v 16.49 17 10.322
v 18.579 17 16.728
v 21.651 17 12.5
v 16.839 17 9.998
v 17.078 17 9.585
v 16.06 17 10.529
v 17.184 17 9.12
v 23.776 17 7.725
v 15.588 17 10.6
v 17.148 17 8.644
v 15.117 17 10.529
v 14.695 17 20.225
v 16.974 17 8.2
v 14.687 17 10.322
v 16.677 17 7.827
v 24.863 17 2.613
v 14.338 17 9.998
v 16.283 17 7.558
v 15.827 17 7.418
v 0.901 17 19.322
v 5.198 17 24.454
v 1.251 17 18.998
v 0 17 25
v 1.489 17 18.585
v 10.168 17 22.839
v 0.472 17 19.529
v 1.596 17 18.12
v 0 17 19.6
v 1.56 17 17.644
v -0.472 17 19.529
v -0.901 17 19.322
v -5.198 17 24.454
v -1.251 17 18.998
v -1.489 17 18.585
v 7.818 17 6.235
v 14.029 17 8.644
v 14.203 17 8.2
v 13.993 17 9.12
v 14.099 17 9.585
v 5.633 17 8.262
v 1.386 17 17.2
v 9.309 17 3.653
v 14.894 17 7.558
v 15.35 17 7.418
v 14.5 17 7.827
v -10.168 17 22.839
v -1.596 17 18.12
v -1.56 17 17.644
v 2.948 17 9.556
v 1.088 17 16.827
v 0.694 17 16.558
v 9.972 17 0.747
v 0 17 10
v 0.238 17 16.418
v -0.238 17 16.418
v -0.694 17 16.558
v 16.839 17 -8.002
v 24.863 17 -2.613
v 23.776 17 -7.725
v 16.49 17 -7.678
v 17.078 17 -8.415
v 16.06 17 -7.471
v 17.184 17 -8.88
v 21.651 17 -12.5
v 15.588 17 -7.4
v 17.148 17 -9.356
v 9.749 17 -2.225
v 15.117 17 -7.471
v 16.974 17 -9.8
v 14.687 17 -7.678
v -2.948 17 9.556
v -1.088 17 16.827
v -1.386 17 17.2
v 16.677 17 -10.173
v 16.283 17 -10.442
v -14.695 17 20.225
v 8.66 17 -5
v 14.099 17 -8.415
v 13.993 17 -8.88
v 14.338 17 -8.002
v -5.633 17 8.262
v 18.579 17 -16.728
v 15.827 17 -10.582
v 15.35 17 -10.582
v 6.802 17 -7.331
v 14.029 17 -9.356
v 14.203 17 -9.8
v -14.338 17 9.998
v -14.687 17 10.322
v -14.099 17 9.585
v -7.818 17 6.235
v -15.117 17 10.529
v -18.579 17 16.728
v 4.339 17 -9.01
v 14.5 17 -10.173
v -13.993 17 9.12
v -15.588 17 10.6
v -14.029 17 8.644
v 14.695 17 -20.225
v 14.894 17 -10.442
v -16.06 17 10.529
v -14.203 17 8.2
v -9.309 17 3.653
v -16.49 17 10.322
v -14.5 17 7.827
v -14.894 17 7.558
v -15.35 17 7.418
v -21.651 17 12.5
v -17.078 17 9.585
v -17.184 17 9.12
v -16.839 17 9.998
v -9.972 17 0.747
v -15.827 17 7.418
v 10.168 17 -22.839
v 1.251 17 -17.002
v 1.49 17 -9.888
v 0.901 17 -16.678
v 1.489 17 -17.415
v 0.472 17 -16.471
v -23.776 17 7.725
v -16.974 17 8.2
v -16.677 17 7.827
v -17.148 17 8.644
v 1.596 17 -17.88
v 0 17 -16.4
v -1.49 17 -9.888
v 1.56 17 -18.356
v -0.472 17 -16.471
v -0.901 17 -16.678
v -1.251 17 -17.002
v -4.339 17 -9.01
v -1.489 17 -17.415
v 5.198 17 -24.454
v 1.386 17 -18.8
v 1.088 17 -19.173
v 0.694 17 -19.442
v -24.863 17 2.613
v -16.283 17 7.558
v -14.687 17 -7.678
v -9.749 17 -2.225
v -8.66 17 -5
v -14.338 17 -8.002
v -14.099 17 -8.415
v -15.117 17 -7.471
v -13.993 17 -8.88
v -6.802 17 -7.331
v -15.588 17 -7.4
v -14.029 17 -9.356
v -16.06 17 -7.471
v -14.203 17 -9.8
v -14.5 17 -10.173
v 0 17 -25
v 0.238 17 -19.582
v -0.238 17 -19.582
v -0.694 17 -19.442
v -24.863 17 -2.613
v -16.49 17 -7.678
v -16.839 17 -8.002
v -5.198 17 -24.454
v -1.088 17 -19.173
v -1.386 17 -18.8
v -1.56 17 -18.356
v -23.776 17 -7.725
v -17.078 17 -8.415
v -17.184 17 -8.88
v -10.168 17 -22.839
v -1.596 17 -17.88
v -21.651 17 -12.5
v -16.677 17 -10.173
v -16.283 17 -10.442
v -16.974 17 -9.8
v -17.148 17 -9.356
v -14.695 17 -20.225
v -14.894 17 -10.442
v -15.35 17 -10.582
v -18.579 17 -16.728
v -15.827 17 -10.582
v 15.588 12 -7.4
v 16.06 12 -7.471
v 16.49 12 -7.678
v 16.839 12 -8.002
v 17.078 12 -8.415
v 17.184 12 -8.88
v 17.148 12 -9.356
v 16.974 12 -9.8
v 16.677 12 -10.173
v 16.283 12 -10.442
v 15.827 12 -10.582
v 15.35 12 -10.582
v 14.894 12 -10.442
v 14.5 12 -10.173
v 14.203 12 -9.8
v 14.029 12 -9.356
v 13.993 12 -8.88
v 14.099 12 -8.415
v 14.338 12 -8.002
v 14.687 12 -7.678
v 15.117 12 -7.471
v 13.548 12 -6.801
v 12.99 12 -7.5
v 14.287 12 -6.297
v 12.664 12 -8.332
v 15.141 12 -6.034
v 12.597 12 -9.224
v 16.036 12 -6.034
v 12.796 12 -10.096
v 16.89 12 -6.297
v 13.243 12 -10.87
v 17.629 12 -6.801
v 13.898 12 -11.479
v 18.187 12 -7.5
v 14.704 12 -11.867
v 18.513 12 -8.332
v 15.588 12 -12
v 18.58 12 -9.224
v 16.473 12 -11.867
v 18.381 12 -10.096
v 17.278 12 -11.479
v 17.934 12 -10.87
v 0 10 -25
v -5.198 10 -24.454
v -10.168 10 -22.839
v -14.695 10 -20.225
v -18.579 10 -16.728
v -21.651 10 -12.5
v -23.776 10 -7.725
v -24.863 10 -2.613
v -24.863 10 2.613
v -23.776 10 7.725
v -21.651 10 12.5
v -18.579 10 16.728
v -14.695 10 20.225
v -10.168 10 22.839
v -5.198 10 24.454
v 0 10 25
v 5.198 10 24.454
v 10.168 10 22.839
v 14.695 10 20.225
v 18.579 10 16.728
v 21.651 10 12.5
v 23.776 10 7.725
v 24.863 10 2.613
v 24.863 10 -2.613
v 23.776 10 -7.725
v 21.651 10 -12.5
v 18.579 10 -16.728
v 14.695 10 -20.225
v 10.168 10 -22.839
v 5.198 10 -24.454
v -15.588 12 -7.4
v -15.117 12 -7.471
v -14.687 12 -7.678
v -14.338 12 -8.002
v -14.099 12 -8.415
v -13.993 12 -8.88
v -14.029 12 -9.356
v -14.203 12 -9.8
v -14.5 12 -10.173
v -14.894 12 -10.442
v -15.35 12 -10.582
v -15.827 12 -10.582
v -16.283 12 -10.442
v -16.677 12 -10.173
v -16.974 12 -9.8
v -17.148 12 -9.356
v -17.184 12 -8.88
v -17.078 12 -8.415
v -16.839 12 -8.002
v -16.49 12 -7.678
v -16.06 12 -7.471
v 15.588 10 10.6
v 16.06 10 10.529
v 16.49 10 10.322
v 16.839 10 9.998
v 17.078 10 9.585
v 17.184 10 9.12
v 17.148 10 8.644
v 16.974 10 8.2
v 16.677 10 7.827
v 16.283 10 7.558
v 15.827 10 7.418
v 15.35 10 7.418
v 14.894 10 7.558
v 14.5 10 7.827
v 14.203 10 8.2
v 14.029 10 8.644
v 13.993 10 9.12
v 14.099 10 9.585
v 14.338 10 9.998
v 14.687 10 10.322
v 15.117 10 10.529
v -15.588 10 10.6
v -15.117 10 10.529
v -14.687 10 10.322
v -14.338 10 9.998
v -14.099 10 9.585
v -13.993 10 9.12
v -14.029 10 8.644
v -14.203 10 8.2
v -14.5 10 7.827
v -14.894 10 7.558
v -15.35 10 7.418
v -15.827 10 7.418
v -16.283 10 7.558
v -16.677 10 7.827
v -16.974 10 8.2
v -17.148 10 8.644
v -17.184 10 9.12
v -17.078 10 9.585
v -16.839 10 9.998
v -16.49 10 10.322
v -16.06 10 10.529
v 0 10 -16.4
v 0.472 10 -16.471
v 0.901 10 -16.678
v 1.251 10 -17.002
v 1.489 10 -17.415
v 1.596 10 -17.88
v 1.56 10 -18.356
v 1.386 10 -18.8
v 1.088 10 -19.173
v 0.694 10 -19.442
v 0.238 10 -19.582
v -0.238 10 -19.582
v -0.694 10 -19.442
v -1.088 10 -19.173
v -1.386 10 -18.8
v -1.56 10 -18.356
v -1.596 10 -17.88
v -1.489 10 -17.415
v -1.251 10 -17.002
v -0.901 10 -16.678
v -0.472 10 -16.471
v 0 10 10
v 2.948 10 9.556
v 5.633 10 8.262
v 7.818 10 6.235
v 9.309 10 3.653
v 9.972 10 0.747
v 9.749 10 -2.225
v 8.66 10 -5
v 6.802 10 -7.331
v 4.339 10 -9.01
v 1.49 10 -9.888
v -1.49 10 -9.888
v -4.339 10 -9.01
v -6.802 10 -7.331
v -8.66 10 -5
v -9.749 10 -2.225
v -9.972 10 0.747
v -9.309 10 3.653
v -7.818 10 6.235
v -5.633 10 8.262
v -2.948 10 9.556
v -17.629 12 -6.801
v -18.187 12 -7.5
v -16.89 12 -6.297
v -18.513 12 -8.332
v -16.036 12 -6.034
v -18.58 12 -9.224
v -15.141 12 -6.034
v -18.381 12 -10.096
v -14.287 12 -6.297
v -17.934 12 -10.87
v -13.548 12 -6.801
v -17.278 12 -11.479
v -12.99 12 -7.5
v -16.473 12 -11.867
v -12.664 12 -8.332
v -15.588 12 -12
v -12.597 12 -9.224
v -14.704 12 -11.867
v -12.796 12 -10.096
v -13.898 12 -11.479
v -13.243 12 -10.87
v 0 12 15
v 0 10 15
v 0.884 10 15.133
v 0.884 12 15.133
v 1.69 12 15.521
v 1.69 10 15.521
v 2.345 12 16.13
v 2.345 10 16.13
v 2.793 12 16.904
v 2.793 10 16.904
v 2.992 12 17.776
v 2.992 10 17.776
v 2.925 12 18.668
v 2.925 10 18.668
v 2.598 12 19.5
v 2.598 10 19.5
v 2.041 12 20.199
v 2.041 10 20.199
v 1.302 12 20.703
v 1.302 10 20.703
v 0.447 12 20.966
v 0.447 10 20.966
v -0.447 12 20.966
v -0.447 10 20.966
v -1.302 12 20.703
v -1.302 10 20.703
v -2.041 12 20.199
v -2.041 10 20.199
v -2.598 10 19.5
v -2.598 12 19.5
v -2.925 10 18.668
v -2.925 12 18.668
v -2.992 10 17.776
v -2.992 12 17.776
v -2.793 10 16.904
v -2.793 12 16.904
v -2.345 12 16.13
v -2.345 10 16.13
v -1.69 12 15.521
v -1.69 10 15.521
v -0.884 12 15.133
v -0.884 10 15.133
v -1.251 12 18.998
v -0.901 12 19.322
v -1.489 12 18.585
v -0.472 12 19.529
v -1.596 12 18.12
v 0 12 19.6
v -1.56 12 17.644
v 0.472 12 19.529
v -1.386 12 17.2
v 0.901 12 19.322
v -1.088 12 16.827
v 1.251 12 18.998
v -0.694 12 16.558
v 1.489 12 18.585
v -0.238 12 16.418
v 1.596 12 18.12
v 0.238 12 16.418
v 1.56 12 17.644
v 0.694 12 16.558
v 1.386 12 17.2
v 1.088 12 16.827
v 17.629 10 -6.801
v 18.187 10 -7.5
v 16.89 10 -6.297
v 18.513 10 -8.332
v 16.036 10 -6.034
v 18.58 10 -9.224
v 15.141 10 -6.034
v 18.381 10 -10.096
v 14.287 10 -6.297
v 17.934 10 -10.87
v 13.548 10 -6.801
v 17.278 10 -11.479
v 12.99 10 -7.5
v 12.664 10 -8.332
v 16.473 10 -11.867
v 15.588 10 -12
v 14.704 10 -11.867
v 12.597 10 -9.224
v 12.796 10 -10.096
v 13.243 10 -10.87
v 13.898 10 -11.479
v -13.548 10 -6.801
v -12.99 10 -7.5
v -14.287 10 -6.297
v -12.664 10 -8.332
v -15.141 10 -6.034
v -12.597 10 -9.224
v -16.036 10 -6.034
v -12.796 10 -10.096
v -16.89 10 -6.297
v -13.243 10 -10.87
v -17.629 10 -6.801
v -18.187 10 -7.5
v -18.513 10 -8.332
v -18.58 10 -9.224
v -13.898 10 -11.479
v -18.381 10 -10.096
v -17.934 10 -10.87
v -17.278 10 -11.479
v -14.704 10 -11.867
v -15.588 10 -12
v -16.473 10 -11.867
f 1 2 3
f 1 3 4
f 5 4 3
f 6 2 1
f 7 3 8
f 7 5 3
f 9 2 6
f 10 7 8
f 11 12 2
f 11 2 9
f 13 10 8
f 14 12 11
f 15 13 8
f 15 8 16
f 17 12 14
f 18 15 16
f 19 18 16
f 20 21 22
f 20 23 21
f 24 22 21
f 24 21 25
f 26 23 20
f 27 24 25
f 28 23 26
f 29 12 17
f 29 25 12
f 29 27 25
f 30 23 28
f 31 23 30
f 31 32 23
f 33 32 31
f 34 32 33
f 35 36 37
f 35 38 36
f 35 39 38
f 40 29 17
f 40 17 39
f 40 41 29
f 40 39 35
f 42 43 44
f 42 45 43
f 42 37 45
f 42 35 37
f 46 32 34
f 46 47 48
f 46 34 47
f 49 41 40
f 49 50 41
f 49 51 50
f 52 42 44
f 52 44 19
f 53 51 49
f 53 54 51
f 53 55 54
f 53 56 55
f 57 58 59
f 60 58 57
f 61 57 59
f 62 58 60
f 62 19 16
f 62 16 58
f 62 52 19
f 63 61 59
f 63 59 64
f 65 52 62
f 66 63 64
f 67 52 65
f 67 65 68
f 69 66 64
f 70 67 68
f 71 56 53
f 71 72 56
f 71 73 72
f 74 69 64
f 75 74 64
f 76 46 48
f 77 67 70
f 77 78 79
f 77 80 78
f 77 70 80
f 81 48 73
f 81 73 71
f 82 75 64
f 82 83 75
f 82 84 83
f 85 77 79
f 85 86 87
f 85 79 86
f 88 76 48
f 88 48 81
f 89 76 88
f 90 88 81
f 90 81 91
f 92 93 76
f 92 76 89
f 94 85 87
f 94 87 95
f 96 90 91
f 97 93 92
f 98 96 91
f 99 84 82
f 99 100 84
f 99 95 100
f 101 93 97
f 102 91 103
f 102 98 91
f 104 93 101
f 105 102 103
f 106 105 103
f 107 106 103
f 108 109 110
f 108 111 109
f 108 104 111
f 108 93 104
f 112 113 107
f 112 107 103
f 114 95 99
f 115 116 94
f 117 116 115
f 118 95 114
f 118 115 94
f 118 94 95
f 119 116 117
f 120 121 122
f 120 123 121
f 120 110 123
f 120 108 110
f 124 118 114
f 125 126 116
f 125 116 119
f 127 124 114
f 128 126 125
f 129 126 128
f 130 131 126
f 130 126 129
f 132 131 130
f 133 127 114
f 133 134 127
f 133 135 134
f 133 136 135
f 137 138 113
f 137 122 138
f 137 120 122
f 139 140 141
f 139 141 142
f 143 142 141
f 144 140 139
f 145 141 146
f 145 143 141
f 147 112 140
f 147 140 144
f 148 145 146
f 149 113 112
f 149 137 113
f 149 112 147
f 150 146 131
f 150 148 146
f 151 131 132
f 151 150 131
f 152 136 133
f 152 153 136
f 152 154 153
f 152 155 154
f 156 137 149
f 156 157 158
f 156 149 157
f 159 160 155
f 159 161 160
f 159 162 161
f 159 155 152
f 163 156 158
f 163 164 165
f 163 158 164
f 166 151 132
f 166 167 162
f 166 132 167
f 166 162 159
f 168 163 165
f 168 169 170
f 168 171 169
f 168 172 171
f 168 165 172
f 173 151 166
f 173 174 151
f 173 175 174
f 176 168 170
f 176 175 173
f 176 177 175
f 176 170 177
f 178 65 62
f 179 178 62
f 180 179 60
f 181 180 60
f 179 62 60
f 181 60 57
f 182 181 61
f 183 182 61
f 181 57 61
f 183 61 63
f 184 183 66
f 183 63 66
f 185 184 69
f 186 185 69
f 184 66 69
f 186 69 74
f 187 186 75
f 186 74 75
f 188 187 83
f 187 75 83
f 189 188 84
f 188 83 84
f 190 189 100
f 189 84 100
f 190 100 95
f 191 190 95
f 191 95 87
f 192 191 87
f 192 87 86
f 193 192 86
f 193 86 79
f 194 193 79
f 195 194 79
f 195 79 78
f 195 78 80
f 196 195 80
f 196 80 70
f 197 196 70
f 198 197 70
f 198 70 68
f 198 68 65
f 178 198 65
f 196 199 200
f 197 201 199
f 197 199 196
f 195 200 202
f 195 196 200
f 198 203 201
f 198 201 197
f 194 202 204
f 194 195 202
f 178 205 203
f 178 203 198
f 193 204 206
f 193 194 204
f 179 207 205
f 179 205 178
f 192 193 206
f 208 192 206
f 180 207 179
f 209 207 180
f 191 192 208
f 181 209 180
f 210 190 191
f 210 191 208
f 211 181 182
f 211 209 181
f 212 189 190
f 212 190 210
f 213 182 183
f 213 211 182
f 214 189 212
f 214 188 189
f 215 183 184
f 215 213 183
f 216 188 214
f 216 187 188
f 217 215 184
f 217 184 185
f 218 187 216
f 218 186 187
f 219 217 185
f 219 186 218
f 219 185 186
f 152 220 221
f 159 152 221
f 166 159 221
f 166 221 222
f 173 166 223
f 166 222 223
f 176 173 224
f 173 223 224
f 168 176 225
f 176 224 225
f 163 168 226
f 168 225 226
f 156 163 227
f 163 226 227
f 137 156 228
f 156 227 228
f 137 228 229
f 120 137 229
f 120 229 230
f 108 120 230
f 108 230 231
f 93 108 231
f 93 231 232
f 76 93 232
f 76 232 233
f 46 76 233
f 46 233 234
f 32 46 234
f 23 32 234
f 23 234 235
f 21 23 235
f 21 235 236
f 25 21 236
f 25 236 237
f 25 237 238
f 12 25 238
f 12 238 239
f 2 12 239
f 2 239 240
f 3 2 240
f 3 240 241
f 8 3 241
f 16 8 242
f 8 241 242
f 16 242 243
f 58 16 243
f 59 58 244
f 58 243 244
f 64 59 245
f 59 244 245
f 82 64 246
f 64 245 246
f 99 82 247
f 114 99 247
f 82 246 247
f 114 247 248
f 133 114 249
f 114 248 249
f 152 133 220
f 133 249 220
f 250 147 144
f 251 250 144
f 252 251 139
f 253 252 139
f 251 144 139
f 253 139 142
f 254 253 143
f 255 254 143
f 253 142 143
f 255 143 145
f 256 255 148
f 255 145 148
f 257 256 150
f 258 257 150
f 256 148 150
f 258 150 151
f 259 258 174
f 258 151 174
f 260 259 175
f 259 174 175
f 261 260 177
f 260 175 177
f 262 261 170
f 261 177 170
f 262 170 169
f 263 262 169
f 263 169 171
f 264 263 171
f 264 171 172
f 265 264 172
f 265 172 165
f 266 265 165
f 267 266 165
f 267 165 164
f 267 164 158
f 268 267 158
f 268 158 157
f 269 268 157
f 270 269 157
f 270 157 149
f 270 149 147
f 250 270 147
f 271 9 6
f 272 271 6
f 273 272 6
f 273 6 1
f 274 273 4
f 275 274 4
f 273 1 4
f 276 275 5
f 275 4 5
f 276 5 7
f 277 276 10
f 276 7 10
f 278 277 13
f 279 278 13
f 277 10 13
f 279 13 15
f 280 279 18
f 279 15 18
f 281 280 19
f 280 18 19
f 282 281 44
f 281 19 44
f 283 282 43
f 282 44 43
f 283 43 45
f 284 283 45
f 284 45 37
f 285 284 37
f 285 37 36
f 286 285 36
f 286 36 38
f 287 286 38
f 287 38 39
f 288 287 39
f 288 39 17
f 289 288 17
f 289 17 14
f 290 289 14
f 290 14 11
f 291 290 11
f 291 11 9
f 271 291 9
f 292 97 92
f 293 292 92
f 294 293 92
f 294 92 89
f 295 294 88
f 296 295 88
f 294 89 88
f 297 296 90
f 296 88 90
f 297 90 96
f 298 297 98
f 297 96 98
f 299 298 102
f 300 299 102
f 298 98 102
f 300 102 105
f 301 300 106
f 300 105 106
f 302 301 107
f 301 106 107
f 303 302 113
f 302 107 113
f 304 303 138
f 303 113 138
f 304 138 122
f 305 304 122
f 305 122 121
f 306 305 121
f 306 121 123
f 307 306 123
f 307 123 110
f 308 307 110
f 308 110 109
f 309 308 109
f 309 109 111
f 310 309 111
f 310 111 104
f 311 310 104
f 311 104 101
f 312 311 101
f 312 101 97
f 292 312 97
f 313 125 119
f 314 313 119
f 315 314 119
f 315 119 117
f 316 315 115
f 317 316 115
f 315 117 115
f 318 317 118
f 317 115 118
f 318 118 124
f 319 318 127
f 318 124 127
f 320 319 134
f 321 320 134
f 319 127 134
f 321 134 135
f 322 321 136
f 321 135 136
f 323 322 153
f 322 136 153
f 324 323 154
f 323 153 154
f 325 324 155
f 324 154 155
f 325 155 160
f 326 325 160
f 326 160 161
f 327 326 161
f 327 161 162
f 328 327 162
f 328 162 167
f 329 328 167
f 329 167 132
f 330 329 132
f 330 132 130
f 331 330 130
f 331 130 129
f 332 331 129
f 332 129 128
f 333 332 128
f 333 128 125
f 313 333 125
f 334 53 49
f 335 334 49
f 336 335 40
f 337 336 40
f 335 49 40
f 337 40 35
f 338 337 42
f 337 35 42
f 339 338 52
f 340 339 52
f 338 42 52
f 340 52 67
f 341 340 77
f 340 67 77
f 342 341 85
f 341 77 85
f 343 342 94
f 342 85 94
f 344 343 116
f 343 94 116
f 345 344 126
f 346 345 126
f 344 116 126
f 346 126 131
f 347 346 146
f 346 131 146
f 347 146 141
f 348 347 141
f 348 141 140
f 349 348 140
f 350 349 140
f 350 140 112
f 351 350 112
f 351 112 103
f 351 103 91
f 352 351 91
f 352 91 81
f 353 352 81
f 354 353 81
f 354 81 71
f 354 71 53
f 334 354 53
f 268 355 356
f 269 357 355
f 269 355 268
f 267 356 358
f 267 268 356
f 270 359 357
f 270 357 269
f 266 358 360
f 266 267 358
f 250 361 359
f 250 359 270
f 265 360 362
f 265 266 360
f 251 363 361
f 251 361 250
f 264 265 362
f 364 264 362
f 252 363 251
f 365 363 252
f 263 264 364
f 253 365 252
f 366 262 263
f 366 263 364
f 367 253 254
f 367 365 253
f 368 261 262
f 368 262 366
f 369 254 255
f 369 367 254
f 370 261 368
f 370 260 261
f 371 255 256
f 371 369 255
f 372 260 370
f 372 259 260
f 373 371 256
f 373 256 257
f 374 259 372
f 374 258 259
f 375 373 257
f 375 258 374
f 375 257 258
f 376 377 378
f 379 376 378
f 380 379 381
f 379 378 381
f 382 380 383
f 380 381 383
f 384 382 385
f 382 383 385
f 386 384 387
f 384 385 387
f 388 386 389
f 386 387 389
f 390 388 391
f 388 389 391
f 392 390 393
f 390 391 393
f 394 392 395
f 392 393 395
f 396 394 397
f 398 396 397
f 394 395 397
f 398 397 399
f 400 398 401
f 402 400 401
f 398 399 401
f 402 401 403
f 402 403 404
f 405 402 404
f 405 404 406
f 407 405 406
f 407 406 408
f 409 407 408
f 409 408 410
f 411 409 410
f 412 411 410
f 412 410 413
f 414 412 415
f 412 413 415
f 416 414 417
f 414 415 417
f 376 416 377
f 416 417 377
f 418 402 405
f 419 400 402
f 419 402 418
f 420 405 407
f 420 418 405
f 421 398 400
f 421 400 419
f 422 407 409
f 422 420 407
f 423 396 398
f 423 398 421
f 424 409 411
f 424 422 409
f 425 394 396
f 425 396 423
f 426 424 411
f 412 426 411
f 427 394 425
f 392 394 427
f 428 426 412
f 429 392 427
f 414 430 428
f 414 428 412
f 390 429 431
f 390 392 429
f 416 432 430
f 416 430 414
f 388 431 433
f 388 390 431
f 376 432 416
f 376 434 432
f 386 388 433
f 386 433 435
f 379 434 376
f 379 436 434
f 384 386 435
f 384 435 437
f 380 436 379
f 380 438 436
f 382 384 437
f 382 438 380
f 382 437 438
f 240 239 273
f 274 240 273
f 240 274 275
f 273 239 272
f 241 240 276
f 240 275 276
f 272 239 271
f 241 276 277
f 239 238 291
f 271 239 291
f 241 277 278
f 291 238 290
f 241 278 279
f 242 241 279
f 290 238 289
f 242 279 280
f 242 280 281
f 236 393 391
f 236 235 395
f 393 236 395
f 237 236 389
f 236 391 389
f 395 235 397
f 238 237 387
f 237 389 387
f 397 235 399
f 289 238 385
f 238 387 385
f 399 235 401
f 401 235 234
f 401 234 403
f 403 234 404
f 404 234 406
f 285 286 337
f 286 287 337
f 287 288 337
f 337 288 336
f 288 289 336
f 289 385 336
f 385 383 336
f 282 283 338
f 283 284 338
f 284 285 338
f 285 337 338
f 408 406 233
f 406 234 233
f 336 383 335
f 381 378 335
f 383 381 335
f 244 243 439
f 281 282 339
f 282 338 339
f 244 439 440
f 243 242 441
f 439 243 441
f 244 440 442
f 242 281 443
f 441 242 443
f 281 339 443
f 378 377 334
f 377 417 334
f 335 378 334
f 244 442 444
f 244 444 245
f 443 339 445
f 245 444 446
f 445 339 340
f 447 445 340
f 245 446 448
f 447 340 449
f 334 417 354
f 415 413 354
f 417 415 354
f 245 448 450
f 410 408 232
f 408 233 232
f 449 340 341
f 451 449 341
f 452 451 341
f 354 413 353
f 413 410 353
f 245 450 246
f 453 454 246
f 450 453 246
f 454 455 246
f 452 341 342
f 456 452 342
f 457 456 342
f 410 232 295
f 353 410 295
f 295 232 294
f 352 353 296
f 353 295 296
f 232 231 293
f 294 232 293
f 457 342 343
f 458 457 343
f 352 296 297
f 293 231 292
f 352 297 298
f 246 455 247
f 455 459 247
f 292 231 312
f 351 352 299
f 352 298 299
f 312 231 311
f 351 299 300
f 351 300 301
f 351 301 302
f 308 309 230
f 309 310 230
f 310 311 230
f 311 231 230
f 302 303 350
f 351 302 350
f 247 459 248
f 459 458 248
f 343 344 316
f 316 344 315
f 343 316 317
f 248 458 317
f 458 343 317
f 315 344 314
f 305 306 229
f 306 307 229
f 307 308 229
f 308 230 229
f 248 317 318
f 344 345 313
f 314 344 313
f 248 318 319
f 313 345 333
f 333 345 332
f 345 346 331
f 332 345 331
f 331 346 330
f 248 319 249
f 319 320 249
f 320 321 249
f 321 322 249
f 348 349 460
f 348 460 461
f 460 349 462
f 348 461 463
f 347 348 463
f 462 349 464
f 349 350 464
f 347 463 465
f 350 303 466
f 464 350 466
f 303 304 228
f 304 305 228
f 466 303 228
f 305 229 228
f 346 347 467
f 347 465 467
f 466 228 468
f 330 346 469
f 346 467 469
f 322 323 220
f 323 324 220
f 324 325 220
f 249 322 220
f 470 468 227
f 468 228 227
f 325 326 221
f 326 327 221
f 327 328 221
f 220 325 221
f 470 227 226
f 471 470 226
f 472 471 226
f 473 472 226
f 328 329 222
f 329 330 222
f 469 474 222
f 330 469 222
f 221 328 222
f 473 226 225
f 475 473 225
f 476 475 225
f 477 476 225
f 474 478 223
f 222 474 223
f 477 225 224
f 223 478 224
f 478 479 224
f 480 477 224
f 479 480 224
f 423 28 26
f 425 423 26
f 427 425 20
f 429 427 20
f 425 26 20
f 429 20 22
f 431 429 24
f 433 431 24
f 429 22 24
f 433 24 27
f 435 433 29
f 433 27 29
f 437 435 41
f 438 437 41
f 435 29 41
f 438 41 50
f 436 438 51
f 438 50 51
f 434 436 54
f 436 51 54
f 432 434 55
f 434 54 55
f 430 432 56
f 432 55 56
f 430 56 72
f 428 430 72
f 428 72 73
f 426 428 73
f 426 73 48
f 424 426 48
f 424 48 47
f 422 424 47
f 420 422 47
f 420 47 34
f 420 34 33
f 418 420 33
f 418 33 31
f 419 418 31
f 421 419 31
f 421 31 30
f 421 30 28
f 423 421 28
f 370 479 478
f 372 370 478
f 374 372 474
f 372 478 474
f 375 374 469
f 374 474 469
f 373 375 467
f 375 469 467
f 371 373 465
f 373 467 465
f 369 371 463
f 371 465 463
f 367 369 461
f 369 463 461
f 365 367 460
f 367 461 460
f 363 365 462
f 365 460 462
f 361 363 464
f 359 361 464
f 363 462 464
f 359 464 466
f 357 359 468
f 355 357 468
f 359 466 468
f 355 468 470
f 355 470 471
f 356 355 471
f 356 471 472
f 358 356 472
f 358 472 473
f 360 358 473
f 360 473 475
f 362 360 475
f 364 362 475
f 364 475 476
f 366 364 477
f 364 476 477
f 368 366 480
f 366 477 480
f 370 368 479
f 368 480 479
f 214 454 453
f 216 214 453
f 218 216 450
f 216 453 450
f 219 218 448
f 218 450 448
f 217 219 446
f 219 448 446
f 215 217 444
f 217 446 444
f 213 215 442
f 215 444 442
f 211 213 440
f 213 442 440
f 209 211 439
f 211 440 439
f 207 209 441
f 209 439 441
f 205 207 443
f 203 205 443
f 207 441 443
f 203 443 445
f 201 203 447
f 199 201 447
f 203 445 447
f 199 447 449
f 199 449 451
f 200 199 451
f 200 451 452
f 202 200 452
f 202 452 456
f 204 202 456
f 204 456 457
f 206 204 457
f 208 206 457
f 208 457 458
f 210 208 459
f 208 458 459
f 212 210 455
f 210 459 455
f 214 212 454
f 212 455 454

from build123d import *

# Parameters (mm, degrees)
SKETCH1_R             = 3
BOSS_EXTRUDE1_DEPTH   = 10
BOSS_EXTRUDE1_2_DEPTH = 10
BOSS_EXTRUDE1_3_DEPTH = 10
BOSS_EXTRUDE1_4_DEPTH = 10
BOSS_EXTRUDE1_5_DEPTH = 10
BOSS_EXTRUDE1_6_DEPTH = 10
SKETCH2_R             = 25
BOSS_EXTRUDE2_DEPTH   = 7
SKETCH3_R             = 10
CUT_EXTRUDE1_DEPTH    = 40.230090492
SKETCH4_R             = 1.6
CUT_EXTRUDE2_DEPTH    = 10
SKETCH5_W             = 46.619491236
SKETCH5_H             = 46.698911153
CUT_EXTRUDE3_DEPTH    = 10
SKETCH6_R             = 3
CUT_EXTRUDE4_DEPTH    = 2


with BuildPart() as part:
    # Sketch1 → Boss-Extrude1 (new body)
    with BuildSketch(Plane(origin=(0, 0, 0), x_dir=(1, 0, 0), z_dir=(0, 1, 0))):
        with Locations(Location((0, 18, 0), (0, 0, 270))):
            Circle(SKETCH1_R)
    extrude(amount=BOSS_EXTRUDE1_DEPTH)



with BuildPart() as body_2:
    # Sketch1 → Boss-Extrude1 2 (new body)
    with BuildSketch(Plane(origin=(0, 0, 0), x_dir=(1, 0, 0), z_dir=(0, 1, 0))):
        with Locations(Location((15.588457268, 9, 0), (0, 0, 270))):
            Circle(SKETCH1_R)
    extrude(amount=BOSS_EXTRUDE1_2_DEPTH)


with BuildPart() as body_3:
    # Sketch1 → Boss-Extrude1 3 (new body)
    with BuildSketch(Plane(origin=(0, 0, 0), x_dir=(1, 0, 0), z_dir=(0, 1, 0))):
        with Locations(Location((15.588457268, -9, 0), (0, 0, 270))):
            Circle(SKETCH1_R)
    extrude(amount=BOSS_EXTRUDE1_3_DEPTH)


with BuildPart() as body_4:
    # Sketch1 → Boss-Extrude1 4 (new body)
    with BuildSketch(Plane(origin=(0, 0, 0), x_dir=(1, 0, 0), z_dir=(0, 1, 0))):
        with Locations(Location((0, -18, 0), (0, 0, 270))):
            Circle(SKETCH1_R)
    extrude(amount=BOSS_EXTRUDE1_4_DEPTH)


with BuildPart() as body_5:
    # Sketch1 → Boss-Extrude1 5 (new body)
    with BuildSketch(Plane(origin=(0, 0, 0), x_dir=(1, 0, 0), z_dir=(0, 1, 0))):
        with Locations(Location((-15.588457268, -9, 0), (0, 0, 270))):
            Circle(SKETCH1_R)
    extrude(amount=BOSS_EXTRUDE1_5_DEPTH)


with BuildPart() as body_6:
    # Sketch1 → Boss-Extrude1 6 (new body)
    with BuildSketch(Plane(origin=(0, 0, 0), x_dir=(1, 0, 0), z_dir=(0, 1, 0))):
        with Locations(Location((-15.588457268, 9, 0), (0, 0, 270))):
            Circle(SKETCH1_R)
    extrude(amount=BOSS_EXTRUDE1_6_DEPTH)


with BuildPart() as part_1:
    add(part.part)

    add(body_2.part)  # Boss-Extrude2 merges body 2

    add(body_3.part)  # Boss-Extrude2 merges body 3

    add(body_4.part)  # Boss-Extrude2 merges body 4

    add(body_5.part)  # Boss-Extrude2 merges body 5

    add(body_6.part)  # Boss-Extrude2 merges body 6
    # Sketch2 → Boss-Extrude2 (add)
    with BuildSketch(Plane(origin=(0, 10, 0), x_dir=(1, 0, 0), z_dir=(0, 1, 0))):
        with Locations(Location((0, 0, 0), (0, 0, 90))):
            Circle(SKETCH2_R)
    extrude(amount=BOSS_EXTRUDE2_DEPTH)

    # Sketch3 → Cut-Extrude1 (cut, through all)
    with BuildSketch(Plane(origin=(0, 17, 0), x_dir=(1, 0, 0), z_dir=(0, 1, 0))):
        with Locations(Location((0, 0, 0), (0, 0, 270))):
            Circle(SKETCH3_R)
    extrude(amount=-CUT_EXTRUDE1_DEPTH, mode=Mode.SUBTRACT)

    # Sketch4 → Cut-Extrude2 (cut)
    with BuildSketch(Plane(origin=(0, 17, 0), x_dir=(1, 0, 0), z_dir=(0, 1, 0))):
        with Locations(Location((0, 18, 0), (0, 0, 270))):
            Circle(SKETCH4_R)
        with Locations(Location((15.588457268, 9, 0), (0, 0, 270))):
            Circle(SKETCH4_R)
        with Locations(Location((15.588457268, -9, 0), (0, 0, 270))):
            Circle(SKETCH4_R)
        with Locations(Location((0, -18, 0), (0, 0, 270))):
            Circle(SKETCH4_R)
        with Locations(Location((-15.588457268, -9, 0), (0, 0, 270))):
            Circle(SKETCH4_R)
        with Locations(Location((-15.588457268, 9, 0), (0, 0, 270))):
            Circle(SKETCH4_R)
    extrude(amount=-CUT_EXTRUDE2_DEPTH, mode=Mode.SUBTRACT)

    # Sketch5 → Cut-Extrude3 (cut)
    with BuildSketch(Plane.XZ):
        with Locations((3.295926552, -0.079419917)):
            Rectangle(SKETCH5_W, SKETCH5_H)
    extrude(amount=-CUT_EXTRUDE3_DEPTH, mode=Mode.SUBTRACT)

    # Sketch6 → Cut-Extrude4 (cut)
    with BuildSketch(Plane(origin=(0, 10, 0), x_dir=(-1, 0, 0), z_dir=(0, -1, 0))):
        with Locations(Location((0, -18, 0), (0, 0, 90))):
            Circle(SKETCH6_R)
        with Locations(Location((15.588457268, 9, 0), (0, 0, 90))):
            Circle(SKETCH6_R)
        with Locations(Location((-15.588457268, 9, 0), (0, 0, 90))):
            Circle(SKETCH6_R)
    extrude(amount=-CUT_EXTRUDE4_DEPTH, mode=Mode.SUBTRACT)


solid = part_1.part
